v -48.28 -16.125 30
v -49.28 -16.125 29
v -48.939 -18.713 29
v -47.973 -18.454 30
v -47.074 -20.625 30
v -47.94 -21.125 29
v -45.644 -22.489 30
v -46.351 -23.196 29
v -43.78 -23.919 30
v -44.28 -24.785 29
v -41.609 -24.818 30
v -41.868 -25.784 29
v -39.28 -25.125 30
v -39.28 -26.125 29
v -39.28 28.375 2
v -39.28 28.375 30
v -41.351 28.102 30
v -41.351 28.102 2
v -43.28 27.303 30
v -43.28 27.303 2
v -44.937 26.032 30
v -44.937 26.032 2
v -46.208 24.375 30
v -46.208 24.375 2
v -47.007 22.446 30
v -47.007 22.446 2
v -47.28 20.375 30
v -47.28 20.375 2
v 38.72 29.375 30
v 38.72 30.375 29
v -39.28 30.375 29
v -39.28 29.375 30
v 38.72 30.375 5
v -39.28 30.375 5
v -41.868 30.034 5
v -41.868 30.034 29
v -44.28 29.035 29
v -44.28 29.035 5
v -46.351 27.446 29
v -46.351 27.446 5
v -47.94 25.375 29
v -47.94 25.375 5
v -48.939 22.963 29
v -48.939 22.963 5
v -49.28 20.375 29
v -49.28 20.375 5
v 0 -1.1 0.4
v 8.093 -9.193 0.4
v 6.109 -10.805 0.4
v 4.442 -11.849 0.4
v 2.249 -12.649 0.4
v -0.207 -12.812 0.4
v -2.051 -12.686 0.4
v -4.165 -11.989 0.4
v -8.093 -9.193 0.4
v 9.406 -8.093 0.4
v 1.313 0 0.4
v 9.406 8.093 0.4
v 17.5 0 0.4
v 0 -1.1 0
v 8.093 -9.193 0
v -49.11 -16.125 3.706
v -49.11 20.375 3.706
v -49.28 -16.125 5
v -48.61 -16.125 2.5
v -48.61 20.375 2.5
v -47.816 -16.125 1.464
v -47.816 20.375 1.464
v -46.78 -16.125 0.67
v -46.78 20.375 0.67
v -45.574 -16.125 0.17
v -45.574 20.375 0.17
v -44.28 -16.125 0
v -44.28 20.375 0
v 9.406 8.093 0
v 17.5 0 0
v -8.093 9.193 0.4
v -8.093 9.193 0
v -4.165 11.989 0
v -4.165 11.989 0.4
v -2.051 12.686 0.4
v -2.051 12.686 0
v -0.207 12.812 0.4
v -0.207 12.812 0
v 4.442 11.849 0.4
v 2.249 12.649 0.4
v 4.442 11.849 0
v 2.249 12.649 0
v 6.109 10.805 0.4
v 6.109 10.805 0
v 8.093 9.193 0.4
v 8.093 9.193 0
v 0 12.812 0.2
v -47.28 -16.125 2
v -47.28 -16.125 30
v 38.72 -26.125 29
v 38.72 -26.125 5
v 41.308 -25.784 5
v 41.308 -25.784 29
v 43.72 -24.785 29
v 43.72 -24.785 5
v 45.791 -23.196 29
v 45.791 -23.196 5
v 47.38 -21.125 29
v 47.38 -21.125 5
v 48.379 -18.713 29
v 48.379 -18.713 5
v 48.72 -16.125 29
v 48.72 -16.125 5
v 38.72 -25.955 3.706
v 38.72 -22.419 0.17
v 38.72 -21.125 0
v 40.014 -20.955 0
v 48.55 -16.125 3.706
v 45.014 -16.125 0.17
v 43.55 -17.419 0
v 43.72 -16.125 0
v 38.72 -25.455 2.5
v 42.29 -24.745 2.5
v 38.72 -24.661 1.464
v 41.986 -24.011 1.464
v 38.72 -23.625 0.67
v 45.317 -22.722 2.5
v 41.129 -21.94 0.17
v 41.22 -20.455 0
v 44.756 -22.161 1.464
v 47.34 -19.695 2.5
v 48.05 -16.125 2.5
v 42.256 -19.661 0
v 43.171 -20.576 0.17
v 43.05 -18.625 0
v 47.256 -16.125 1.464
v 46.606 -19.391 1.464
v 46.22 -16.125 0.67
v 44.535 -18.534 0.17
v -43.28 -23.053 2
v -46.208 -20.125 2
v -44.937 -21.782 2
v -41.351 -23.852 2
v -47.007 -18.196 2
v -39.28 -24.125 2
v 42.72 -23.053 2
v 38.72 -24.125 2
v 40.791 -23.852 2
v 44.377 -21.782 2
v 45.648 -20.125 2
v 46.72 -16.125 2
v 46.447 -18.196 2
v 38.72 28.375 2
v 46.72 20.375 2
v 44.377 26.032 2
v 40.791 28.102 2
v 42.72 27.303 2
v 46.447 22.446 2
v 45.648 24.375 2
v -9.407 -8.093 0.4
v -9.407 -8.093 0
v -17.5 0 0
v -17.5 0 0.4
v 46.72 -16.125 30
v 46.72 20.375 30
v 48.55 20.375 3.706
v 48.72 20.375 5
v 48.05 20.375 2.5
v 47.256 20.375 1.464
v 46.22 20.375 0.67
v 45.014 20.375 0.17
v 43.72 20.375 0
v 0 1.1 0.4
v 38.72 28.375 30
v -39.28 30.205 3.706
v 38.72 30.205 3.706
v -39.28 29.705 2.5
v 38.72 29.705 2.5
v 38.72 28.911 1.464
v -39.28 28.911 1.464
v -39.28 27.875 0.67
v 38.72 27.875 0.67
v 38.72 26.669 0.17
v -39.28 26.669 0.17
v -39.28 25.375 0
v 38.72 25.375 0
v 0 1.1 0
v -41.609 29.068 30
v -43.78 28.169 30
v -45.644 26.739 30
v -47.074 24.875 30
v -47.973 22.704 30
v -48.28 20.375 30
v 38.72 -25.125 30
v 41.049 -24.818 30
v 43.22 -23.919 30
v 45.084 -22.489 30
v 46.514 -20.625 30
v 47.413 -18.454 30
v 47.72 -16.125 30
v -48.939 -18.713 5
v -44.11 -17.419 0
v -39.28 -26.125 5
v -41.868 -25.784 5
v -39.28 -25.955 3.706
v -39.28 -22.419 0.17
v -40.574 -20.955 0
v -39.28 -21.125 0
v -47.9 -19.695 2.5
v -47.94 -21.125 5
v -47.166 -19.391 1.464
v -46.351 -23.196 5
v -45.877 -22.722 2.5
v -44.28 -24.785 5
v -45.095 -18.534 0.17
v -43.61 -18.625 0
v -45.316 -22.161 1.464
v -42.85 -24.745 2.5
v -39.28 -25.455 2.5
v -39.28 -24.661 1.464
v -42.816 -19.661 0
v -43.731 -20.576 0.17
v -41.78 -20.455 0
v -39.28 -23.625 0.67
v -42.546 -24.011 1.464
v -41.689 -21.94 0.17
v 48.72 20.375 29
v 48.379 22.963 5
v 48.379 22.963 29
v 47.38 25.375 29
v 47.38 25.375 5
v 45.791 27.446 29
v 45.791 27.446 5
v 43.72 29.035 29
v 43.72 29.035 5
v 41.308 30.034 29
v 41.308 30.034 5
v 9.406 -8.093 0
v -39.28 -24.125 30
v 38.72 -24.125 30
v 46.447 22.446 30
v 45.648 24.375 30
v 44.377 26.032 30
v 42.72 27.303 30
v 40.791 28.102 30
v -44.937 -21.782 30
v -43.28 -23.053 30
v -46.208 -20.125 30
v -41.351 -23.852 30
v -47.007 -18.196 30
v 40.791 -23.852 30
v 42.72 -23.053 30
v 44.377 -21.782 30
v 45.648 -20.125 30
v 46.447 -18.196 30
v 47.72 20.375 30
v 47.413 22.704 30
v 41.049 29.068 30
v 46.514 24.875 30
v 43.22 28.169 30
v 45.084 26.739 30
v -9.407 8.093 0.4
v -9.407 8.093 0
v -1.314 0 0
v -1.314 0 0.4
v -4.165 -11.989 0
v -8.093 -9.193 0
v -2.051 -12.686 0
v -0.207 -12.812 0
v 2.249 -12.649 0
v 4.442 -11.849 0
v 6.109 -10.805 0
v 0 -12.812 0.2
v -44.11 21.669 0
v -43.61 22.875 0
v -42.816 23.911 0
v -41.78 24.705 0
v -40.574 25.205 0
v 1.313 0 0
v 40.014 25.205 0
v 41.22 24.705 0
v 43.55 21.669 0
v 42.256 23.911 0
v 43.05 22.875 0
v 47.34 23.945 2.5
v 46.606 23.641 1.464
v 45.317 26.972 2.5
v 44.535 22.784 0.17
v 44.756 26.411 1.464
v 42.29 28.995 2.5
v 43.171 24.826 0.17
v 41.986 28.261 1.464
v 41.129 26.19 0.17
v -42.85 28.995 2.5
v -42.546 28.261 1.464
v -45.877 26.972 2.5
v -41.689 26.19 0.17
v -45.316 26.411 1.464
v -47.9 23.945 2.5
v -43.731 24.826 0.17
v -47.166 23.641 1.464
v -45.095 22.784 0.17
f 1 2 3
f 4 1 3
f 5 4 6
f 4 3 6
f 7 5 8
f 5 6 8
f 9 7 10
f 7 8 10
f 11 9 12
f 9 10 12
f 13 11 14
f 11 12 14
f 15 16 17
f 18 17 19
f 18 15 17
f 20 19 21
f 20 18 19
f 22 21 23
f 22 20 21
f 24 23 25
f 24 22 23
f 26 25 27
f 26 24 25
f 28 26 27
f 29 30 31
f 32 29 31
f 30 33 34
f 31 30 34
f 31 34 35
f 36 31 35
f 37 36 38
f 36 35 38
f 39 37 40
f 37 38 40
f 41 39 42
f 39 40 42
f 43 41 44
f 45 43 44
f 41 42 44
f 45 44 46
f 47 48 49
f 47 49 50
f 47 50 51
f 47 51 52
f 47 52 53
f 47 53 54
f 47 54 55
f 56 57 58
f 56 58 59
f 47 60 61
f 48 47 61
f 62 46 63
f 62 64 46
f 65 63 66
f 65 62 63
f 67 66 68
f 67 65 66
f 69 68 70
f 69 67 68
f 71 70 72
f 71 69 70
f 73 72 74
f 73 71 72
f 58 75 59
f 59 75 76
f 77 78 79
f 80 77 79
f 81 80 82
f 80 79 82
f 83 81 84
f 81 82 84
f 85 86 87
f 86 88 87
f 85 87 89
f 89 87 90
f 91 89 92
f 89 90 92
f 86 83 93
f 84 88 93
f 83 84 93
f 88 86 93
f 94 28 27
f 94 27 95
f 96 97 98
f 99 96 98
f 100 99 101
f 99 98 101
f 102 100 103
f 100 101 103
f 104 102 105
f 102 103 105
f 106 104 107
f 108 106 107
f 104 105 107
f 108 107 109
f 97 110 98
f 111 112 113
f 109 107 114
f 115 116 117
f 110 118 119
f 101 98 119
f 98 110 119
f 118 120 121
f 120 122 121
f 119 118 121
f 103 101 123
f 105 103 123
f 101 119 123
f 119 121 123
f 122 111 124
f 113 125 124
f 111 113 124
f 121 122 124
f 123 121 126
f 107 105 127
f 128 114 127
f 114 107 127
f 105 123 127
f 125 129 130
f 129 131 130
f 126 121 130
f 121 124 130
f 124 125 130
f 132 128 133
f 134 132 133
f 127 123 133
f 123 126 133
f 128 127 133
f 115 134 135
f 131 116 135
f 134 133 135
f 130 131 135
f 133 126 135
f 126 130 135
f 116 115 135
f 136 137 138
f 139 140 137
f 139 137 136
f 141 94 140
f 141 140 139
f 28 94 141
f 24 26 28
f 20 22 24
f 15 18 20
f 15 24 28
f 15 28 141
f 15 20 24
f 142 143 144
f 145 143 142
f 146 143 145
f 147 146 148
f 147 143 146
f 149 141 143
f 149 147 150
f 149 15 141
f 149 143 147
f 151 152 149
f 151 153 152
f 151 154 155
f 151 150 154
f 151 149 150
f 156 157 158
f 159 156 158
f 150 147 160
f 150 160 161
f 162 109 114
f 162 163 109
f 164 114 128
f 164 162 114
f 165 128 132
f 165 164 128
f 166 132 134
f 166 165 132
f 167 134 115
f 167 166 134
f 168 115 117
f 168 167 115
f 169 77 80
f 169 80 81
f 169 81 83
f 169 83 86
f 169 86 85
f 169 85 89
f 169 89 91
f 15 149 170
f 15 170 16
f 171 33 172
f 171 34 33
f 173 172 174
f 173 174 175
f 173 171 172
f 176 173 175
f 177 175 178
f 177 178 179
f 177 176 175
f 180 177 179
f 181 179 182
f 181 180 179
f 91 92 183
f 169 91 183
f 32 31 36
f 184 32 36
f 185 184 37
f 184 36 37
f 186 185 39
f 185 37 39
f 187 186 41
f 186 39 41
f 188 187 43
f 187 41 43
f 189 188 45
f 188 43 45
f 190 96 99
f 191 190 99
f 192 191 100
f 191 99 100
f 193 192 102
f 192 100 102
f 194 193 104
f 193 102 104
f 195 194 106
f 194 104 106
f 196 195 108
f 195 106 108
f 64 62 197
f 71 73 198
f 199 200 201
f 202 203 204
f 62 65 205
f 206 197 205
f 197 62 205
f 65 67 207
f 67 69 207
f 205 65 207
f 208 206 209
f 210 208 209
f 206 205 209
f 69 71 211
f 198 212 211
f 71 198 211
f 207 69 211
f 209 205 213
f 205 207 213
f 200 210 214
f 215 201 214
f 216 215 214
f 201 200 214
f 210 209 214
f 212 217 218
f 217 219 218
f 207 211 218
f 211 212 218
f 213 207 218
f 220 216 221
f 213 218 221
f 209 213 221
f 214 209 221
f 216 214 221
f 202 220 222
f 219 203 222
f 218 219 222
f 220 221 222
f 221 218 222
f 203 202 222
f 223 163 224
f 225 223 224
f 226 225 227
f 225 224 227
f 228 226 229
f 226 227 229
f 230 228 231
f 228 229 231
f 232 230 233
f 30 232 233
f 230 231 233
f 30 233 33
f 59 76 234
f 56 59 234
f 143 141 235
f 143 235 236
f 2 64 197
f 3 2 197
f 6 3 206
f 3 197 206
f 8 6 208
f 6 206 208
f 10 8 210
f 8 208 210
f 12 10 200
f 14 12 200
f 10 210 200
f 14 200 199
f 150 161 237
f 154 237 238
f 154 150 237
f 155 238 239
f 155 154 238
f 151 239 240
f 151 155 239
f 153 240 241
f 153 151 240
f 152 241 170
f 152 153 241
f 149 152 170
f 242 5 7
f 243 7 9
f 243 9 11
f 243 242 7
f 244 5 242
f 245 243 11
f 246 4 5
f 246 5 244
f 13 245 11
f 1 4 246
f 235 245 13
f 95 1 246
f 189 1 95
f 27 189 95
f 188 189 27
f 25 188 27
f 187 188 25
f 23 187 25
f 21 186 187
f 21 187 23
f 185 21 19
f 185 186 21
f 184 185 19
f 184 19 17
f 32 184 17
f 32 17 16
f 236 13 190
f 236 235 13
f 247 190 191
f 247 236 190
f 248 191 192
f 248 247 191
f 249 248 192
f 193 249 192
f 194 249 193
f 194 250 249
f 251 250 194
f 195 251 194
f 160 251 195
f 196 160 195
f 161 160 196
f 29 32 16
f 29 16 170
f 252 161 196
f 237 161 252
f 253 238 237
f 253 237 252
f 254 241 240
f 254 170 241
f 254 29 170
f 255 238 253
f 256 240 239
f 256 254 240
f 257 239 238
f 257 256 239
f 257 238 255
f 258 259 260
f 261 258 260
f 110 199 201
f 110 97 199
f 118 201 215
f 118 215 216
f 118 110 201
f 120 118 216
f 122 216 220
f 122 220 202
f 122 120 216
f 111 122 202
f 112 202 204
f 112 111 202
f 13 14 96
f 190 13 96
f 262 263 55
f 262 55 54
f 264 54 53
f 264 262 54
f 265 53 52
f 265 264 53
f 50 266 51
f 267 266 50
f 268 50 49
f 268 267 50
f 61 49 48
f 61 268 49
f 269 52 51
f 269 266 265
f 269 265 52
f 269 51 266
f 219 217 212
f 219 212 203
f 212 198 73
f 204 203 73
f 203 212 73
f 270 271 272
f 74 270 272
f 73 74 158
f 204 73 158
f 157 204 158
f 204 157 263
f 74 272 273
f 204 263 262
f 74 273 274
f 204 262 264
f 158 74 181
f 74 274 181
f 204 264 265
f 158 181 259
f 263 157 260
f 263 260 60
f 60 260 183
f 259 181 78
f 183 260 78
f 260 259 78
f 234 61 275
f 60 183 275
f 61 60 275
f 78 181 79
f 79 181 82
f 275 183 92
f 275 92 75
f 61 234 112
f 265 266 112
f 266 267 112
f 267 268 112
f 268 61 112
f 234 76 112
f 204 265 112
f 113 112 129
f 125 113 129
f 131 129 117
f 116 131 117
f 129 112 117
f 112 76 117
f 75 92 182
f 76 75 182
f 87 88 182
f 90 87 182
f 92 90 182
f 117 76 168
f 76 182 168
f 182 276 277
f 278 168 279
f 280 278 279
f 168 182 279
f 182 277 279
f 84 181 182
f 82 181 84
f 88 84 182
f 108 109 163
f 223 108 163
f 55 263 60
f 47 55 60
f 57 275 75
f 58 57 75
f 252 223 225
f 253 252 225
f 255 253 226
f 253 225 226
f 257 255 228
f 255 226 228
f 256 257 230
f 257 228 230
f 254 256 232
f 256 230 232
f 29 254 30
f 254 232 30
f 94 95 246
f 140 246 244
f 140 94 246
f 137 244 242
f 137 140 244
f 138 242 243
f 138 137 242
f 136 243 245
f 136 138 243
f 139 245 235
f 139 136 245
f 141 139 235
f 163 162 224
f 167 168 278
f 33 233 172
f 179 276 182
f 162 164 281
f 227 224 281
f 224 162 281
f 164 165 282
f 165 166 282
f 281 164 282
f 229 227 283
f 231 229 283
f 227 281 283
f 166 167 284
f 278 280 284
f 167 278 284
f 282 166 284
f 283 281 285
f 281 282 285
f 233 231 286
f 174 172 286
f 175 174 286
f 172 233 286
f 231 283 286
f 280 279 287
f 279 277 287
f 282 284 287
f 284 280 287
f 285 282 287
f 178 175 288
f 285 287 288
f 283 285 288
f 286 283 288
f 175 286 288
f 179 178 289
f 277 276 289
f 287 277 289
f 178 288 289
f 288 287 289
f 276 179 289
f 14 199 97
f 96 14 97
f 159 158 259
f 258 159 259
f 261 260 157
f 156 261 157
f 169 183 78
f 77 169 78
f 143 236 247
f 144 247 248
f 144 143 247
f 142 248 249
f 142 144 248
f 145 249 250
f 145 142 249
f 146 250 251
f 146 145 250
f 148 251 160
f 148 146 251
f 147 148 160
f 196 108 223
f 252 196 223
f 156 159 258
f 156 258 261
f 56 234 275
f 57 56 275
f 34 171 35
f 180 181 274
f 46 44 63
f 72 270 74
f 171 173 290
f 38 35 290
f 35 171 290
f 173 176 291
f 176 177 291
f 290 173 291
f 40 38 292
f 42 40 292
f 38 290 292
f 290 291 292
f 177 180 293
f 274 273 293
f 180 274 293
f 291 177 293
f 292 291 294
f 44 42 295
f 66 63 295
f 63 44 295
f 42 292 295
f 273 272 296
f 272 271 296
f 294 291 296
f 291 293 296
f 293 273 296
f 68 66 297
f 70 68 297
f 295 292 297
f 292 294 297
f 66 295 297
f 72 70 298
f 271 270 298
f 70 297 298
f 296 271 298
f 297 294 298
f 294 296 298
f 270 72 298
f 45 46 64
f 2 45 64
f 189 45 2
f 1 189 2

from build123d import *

# Parameters (mm, degrees)
F1_DEPTH = 30
F2_T     = -2
F3_R     = 5
F4_SIZE  = 1
F6_DEPTH = 0.4


# Not quite as in the source:
# - ends of sketch curves that miss each other by under 0.0002 mm in the source are joined


with BuildPart() as f1:
    # F0 (on Top) → F1 (new body)
    with BuildSketch(Plane.XY):
        with BuildLine():
            Line((38.72, 30.375), (-39.28, 30.375))
            ThreePointArc((-39.28, 30.375), (-46.3510678119, 27.4460678119), (-49.28, 20.375))
            Line((-49.28, 20.375), (-49.28, -16.125))
            ThreePointArc((-49.28, -16.125), (-46.3510678119, -23.1960678119), (-39.28, -26.125))
            Line((-39.28, -26.125), (38.72, -26.125))
            ThreePointArc((38.72, -26.125), (45.7910678119, -23.1960678119), (48.72, -16.125))
            Line((48.72, -16.125), (48.72, 20.375))
            ThreePointArc((48.72, 20.375), (45.7910678119, 27.4460678119), (38.72, 30.375))
        make_face()
    extrude(amount=F1_DEPTH)

    # F2
    f2_openings = [f1.faces().sort_by_distance(p)[0] for p in [
        (-0.28, 2.125, 30),
    ]]
    offset(amount=F2_T, openings=f2_openings)

    # F3
    f3_edges = [f1.edges().sort_by_distance(p)[0] for p in [
        (-0.28, -26.125, 0),
    ]]
    fillet(f3_edges, radius=F3_R)

    # F4
    f4_edges = [f1.edges().sort_by_distance(p)[0] for p in [
        (-0.28, -26.125, 30),
        (-46.351068, -23.196068, 30),
        (-49.28, 2.125, 30),
        (-46.351068, 27.446068, 30),
        (-0.28, 30.375, 30),
        (45.791068, 27.446068, 30),
        (48.72, 2.125, 30),
        (45.791068, -23.196068, 30),
    ]]
    chamfer(f4_edges, length=F4_SIZE)

    # F5 (on face) → F6 (cut)
    with BuildSketch(Plane(origin=(0, 0, 0), x_dir=(1, 0, 0), z_dir=(0, 0, -1))):
        with BuildLine():
            add(Edge.make_bspline(
                [(-8.093493, 9.19317), (-4.0467455, 12.8119), (2e-06, 12.8119), (4.0467495, 12.8119), (8.093497, 9.19317)],
                knots=[0, 0, 0, 0, 0.5, 1, 1, 1, 1], degree=3))
            Line((-8.093493, 9.19317), (0, 1.099674))
            Line((0, 1.099674), (8.093497, 9.19317))
        make_face()
        Polygon((-1.313547, 1e-06), (-9.40704, 8.093494), (-17.499982, 1e-06), (-9.40704, -8.092941), align=None)
        Polygon((17.499982, 1e-06), (9.406489, 8.093494), (1.312996, 1e-06), (9.406489, -8.092941), align=None)
        with BuildLine():
            Line((8.093495, -9.193168), (0, -1.099672))
            Line((0, -1.099672), (-8.093493, -9.193168))
            add(Edge.make_bspline(
                [(-8.093493, -9.193168), (-4.0467455, -12.811898), (2e-06, -12.811898), (4.0467495, -12.811898), (8.093495, -9.193168)],
                knots=[0, 0, 0, 0, 0.5, 1, 1, 1, 1], degree=3))
        make_face()
    extrude(amount=-F6_DEPTH, mode=Mode.SUBTRACT)


solid = f1.part
